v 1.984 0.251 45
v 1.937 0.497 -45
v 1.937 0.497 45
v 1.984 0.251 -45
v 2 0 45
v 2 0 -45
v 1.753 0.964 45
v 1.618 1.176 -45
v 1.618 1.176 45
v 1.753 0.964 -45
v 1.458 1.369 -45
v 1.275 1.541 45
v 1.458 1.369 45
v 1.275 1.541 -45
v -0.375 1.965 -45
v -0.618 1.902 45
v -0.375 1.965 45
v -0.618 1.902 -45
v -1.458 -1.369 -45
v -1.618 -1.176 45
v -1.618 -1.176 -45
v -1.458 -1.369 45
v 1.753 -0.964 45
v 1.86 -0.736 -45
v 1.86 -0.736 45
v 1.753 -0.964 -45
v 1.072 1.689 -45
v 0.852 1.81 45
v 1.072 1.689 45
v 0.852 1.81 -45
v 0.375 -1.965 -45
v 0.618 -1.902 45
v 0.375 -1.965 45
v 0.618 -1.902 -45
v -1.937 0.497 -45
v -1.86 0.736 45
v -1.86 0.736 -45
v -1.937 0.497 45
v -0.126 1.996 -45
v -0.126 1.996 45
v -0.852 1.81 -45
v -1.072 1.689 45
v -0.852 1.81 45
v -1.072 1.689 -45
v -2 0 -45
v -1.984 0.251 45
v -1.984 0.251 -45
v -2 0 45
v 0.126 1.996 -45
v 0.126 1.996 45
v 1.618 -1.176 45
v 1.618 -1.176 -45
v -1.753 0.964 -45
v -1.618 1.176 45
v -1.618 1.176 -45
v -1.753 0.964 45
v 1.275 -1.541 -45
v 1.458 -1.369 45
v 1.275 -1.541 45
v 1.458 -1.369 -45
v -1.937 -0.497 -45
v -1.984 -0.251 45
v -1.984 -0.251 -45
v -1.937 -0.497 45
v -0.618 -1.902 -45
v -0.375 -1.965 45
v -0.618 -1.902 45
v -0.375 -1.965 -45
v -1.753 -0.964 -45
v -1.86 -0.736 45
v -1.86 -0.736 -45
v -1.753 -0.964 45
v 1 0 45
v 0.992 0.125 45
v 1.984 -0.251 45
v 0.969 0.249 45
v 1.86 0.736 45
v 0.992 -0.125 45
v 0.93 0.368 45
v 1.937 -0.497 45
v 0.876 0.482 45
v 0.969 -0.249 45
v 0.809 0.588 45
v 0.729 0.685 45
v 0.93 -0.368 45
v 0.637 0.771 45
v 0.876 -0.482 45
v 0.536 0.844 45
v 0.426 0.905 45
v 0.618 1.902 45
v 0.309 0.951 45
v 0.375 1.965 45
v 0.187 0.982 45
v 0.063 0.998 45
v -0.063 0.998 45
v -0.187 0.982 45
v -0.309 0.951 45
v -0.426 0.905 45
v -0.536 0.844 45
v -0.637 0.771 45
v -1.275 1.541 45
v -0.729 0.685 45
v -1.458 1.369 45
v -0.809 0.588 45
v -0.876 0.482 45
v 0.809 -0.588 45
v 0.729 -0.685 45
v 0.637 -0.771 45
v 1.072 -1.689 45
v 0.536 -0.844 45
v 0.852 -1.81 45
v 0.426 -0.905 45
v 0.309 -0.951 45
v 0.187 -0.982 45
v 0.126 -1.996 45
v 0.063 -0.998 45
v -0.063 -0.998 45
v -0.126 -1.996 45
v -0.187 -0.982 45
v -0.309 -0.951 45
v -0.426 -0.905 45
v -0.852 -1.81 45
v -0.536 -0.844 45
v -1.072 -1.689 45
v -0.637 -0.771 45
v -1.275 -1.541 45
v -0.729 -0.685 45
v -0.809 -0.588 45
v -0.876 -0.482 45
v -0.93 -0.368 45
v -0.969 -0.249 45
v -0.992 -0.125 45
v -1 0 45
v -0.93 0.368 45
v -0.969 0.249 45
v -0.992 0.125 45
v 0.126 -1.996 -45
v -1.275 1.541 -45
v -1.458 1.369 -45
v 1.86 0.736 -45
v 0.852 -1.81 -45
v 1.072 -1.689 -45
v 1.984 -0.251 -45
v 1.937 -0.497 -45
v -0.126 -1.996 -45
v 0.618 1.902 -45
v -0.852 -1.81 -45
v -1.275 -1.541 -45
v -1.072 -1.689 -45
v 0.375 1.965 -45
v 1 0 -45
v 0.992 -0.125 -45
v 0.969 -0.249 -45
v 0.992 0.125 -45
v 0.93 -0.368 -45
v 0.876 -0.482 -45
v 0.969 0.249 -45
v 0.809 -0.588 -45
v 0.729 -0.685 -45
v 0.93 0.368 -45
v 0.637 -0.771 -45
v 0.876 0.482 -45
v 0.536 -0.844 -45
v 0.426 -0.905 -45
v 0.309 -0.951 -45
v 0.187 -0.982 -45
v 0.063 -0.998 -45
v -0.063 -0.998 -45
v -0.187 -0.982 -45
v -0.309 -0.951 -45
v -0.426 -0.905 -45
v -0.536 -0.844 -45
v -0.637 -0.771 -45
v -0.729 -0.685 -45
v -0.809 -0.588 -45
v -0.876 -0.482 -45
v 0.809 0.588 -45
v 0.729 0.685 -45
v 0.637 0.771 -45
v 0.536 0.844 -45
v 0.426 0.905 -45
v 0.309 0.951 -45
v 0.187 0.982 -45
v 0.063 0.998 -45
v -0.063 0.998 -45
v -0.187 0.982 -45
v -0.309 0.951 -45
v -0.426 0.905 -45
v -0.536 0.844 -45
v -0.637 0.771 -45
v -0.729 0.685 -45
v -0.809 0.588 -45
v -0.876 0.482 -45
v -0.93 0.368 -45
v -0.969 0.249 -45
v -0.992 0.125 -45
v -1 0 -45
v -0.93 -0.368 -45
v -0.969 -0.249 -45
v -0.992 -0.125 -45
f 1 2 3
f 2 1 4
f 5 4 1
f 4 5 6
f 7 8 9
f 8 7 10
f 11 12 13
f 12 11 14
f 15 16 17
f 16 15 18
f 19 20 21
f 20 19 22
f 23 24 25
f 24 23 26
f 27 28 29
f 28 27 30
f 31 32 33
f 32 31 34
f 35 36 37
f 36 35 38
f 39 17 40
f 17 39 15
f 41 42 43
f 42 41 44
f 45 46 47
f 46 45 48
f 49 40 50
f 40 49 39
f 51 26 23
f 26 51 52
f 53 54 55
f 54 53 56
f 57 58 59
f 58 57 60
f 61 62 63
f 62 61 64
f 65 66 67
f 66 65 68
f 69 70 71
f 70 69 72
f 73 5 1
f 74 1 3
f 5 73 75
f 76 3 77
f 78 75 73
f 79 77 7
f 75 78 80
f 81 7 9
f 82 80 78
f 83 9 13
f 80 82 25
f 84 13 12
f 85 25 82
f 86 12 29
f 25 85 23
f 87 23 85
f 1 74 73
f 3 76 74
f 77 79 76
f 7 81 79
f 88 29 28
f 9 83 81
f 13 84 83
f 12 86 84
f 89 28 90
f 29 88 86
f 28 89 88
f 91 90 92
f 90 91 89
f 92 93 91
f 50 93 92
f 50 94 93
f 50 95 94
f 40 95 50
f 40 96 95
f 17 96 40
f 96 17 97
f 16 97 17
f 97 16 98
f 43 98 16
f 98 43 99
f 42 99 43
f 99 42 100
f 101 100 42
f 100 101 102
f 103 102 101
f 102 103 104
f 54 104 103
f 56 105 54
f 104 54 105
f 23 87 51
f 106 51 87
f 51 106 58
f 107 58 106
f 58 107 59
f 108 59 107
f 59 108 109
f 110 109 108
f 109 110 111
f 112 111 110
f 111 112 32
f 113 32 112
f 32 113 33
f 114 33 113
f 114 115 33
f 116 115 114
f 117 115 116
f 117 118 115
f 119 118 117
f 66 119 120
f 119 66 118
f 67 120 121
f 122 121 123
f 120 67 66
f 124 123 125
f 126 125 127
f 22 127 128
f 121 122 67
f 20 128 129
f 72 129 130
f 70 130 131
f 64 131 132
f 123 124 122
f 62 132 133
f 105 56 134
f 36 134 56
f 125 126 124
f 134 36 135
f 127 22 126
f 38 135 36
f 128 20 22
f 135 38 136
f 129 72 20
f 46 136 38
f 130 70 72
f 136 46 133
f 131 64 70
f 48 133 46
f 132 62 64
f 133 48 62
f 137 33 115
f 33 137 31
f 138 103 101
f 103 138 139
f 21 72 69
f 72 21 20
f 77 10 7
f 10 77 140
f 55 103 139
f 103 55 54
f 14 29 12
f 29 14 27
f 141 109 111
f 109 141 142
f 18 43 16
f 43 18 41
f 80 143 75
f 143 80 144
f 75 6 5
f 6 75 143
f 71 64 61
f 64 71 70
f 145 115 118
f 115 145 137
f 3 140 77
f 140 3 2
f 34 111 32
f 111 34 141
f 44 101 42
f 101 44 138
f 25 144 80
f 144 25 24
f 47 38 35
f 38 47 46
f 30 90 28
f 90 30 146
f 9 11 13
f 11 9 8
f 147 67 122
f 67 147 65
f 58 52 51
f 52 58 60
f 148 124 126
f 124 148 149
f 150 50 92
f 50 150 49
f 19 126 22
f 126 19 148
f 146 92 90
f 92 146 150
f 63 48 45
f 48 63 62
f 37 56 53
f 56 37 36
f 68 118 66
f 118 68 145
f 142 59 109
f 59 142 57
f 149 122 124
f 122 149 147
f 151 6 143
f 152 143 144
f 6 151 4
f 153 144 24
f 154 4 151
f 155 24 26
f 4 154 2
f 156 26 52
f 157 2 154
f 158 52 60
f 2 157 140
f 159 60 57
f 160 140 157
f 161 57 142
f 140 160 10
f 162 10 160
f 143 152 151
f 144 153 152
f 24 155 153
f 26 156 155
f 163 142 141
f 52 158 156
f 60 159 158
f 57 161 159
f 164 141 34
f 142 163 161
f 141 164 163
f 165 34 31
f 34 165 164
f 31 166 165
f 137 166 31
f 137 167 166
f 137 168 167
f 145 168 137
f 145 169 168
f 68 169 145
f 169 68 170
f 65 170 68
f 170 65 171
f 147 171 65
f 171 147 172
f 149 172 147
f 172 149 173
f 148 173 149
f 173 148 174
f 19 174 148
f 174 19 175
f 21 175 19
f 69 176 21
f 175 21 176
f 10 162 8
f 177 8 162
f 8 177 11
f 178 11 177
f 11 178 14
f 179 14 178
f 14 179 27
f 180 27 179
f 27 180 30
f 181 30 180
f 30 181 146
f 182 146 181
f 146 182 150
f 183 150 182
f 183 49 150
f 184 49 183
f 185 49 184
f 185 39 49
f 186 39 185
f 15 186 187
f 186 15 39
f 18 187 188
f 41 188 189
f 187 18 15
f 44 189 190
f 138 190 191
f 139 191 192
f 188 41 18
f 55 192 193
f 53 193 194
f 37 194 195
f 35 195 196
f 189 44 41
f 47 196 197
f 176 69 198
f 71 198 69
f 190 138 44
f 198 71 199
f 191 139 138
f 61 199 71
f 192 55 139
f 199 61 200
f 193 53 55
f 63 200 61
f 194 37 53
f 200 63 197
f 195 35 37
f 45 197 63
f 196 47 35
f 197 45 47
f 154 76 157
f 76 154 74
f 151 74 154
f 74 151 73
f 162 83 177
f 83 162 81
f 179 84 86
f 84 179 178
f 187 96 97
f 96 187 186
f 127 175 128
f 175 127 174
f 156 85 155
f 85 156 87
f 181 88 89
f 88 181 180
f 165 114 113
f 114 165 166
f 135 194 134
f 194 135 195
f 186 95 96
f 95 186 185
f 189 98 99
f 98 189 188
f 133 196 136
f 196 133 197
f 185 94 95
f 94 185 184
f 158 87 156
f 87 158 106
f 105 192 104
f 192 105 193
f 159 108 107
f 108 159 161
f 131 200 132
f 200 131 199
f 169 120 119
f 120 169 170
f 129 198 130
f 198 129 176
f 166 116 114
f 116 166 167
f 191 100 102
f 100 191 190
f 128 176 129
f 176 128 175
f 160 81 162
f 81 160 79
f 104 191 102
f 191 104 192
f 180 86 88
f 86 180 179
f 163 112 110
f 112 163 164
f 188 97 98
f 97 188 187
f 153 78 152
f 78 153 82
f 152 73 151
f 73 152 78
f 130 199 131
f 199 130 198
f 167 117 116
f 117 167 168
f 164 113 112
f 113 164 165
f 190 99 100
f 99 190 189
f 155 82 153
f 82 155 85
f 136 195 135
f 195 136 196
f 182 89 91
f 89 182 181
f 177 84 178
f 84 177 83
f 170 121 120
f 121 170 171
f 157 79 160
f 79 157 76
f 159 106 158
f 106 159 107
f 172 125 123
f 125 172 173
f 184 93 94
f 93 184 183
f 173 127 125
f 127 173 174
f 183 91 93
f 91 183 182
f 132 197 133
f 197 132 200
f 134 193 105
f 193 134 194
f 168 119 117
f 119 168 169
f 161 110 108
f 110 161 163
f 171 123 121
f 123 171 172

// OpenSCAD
$fn = 50;


difference() {
	union() {
		translate(v = [0, 0, -45.0000000000]) {
			cylinder(h = 90, r = 2.0000000000);
		}
	}
	union() {
		translate(v = [0, 0, -100.0000000000]) {
			cylinder(h = 200, r = 1.0000000000);
		}
	}
}
